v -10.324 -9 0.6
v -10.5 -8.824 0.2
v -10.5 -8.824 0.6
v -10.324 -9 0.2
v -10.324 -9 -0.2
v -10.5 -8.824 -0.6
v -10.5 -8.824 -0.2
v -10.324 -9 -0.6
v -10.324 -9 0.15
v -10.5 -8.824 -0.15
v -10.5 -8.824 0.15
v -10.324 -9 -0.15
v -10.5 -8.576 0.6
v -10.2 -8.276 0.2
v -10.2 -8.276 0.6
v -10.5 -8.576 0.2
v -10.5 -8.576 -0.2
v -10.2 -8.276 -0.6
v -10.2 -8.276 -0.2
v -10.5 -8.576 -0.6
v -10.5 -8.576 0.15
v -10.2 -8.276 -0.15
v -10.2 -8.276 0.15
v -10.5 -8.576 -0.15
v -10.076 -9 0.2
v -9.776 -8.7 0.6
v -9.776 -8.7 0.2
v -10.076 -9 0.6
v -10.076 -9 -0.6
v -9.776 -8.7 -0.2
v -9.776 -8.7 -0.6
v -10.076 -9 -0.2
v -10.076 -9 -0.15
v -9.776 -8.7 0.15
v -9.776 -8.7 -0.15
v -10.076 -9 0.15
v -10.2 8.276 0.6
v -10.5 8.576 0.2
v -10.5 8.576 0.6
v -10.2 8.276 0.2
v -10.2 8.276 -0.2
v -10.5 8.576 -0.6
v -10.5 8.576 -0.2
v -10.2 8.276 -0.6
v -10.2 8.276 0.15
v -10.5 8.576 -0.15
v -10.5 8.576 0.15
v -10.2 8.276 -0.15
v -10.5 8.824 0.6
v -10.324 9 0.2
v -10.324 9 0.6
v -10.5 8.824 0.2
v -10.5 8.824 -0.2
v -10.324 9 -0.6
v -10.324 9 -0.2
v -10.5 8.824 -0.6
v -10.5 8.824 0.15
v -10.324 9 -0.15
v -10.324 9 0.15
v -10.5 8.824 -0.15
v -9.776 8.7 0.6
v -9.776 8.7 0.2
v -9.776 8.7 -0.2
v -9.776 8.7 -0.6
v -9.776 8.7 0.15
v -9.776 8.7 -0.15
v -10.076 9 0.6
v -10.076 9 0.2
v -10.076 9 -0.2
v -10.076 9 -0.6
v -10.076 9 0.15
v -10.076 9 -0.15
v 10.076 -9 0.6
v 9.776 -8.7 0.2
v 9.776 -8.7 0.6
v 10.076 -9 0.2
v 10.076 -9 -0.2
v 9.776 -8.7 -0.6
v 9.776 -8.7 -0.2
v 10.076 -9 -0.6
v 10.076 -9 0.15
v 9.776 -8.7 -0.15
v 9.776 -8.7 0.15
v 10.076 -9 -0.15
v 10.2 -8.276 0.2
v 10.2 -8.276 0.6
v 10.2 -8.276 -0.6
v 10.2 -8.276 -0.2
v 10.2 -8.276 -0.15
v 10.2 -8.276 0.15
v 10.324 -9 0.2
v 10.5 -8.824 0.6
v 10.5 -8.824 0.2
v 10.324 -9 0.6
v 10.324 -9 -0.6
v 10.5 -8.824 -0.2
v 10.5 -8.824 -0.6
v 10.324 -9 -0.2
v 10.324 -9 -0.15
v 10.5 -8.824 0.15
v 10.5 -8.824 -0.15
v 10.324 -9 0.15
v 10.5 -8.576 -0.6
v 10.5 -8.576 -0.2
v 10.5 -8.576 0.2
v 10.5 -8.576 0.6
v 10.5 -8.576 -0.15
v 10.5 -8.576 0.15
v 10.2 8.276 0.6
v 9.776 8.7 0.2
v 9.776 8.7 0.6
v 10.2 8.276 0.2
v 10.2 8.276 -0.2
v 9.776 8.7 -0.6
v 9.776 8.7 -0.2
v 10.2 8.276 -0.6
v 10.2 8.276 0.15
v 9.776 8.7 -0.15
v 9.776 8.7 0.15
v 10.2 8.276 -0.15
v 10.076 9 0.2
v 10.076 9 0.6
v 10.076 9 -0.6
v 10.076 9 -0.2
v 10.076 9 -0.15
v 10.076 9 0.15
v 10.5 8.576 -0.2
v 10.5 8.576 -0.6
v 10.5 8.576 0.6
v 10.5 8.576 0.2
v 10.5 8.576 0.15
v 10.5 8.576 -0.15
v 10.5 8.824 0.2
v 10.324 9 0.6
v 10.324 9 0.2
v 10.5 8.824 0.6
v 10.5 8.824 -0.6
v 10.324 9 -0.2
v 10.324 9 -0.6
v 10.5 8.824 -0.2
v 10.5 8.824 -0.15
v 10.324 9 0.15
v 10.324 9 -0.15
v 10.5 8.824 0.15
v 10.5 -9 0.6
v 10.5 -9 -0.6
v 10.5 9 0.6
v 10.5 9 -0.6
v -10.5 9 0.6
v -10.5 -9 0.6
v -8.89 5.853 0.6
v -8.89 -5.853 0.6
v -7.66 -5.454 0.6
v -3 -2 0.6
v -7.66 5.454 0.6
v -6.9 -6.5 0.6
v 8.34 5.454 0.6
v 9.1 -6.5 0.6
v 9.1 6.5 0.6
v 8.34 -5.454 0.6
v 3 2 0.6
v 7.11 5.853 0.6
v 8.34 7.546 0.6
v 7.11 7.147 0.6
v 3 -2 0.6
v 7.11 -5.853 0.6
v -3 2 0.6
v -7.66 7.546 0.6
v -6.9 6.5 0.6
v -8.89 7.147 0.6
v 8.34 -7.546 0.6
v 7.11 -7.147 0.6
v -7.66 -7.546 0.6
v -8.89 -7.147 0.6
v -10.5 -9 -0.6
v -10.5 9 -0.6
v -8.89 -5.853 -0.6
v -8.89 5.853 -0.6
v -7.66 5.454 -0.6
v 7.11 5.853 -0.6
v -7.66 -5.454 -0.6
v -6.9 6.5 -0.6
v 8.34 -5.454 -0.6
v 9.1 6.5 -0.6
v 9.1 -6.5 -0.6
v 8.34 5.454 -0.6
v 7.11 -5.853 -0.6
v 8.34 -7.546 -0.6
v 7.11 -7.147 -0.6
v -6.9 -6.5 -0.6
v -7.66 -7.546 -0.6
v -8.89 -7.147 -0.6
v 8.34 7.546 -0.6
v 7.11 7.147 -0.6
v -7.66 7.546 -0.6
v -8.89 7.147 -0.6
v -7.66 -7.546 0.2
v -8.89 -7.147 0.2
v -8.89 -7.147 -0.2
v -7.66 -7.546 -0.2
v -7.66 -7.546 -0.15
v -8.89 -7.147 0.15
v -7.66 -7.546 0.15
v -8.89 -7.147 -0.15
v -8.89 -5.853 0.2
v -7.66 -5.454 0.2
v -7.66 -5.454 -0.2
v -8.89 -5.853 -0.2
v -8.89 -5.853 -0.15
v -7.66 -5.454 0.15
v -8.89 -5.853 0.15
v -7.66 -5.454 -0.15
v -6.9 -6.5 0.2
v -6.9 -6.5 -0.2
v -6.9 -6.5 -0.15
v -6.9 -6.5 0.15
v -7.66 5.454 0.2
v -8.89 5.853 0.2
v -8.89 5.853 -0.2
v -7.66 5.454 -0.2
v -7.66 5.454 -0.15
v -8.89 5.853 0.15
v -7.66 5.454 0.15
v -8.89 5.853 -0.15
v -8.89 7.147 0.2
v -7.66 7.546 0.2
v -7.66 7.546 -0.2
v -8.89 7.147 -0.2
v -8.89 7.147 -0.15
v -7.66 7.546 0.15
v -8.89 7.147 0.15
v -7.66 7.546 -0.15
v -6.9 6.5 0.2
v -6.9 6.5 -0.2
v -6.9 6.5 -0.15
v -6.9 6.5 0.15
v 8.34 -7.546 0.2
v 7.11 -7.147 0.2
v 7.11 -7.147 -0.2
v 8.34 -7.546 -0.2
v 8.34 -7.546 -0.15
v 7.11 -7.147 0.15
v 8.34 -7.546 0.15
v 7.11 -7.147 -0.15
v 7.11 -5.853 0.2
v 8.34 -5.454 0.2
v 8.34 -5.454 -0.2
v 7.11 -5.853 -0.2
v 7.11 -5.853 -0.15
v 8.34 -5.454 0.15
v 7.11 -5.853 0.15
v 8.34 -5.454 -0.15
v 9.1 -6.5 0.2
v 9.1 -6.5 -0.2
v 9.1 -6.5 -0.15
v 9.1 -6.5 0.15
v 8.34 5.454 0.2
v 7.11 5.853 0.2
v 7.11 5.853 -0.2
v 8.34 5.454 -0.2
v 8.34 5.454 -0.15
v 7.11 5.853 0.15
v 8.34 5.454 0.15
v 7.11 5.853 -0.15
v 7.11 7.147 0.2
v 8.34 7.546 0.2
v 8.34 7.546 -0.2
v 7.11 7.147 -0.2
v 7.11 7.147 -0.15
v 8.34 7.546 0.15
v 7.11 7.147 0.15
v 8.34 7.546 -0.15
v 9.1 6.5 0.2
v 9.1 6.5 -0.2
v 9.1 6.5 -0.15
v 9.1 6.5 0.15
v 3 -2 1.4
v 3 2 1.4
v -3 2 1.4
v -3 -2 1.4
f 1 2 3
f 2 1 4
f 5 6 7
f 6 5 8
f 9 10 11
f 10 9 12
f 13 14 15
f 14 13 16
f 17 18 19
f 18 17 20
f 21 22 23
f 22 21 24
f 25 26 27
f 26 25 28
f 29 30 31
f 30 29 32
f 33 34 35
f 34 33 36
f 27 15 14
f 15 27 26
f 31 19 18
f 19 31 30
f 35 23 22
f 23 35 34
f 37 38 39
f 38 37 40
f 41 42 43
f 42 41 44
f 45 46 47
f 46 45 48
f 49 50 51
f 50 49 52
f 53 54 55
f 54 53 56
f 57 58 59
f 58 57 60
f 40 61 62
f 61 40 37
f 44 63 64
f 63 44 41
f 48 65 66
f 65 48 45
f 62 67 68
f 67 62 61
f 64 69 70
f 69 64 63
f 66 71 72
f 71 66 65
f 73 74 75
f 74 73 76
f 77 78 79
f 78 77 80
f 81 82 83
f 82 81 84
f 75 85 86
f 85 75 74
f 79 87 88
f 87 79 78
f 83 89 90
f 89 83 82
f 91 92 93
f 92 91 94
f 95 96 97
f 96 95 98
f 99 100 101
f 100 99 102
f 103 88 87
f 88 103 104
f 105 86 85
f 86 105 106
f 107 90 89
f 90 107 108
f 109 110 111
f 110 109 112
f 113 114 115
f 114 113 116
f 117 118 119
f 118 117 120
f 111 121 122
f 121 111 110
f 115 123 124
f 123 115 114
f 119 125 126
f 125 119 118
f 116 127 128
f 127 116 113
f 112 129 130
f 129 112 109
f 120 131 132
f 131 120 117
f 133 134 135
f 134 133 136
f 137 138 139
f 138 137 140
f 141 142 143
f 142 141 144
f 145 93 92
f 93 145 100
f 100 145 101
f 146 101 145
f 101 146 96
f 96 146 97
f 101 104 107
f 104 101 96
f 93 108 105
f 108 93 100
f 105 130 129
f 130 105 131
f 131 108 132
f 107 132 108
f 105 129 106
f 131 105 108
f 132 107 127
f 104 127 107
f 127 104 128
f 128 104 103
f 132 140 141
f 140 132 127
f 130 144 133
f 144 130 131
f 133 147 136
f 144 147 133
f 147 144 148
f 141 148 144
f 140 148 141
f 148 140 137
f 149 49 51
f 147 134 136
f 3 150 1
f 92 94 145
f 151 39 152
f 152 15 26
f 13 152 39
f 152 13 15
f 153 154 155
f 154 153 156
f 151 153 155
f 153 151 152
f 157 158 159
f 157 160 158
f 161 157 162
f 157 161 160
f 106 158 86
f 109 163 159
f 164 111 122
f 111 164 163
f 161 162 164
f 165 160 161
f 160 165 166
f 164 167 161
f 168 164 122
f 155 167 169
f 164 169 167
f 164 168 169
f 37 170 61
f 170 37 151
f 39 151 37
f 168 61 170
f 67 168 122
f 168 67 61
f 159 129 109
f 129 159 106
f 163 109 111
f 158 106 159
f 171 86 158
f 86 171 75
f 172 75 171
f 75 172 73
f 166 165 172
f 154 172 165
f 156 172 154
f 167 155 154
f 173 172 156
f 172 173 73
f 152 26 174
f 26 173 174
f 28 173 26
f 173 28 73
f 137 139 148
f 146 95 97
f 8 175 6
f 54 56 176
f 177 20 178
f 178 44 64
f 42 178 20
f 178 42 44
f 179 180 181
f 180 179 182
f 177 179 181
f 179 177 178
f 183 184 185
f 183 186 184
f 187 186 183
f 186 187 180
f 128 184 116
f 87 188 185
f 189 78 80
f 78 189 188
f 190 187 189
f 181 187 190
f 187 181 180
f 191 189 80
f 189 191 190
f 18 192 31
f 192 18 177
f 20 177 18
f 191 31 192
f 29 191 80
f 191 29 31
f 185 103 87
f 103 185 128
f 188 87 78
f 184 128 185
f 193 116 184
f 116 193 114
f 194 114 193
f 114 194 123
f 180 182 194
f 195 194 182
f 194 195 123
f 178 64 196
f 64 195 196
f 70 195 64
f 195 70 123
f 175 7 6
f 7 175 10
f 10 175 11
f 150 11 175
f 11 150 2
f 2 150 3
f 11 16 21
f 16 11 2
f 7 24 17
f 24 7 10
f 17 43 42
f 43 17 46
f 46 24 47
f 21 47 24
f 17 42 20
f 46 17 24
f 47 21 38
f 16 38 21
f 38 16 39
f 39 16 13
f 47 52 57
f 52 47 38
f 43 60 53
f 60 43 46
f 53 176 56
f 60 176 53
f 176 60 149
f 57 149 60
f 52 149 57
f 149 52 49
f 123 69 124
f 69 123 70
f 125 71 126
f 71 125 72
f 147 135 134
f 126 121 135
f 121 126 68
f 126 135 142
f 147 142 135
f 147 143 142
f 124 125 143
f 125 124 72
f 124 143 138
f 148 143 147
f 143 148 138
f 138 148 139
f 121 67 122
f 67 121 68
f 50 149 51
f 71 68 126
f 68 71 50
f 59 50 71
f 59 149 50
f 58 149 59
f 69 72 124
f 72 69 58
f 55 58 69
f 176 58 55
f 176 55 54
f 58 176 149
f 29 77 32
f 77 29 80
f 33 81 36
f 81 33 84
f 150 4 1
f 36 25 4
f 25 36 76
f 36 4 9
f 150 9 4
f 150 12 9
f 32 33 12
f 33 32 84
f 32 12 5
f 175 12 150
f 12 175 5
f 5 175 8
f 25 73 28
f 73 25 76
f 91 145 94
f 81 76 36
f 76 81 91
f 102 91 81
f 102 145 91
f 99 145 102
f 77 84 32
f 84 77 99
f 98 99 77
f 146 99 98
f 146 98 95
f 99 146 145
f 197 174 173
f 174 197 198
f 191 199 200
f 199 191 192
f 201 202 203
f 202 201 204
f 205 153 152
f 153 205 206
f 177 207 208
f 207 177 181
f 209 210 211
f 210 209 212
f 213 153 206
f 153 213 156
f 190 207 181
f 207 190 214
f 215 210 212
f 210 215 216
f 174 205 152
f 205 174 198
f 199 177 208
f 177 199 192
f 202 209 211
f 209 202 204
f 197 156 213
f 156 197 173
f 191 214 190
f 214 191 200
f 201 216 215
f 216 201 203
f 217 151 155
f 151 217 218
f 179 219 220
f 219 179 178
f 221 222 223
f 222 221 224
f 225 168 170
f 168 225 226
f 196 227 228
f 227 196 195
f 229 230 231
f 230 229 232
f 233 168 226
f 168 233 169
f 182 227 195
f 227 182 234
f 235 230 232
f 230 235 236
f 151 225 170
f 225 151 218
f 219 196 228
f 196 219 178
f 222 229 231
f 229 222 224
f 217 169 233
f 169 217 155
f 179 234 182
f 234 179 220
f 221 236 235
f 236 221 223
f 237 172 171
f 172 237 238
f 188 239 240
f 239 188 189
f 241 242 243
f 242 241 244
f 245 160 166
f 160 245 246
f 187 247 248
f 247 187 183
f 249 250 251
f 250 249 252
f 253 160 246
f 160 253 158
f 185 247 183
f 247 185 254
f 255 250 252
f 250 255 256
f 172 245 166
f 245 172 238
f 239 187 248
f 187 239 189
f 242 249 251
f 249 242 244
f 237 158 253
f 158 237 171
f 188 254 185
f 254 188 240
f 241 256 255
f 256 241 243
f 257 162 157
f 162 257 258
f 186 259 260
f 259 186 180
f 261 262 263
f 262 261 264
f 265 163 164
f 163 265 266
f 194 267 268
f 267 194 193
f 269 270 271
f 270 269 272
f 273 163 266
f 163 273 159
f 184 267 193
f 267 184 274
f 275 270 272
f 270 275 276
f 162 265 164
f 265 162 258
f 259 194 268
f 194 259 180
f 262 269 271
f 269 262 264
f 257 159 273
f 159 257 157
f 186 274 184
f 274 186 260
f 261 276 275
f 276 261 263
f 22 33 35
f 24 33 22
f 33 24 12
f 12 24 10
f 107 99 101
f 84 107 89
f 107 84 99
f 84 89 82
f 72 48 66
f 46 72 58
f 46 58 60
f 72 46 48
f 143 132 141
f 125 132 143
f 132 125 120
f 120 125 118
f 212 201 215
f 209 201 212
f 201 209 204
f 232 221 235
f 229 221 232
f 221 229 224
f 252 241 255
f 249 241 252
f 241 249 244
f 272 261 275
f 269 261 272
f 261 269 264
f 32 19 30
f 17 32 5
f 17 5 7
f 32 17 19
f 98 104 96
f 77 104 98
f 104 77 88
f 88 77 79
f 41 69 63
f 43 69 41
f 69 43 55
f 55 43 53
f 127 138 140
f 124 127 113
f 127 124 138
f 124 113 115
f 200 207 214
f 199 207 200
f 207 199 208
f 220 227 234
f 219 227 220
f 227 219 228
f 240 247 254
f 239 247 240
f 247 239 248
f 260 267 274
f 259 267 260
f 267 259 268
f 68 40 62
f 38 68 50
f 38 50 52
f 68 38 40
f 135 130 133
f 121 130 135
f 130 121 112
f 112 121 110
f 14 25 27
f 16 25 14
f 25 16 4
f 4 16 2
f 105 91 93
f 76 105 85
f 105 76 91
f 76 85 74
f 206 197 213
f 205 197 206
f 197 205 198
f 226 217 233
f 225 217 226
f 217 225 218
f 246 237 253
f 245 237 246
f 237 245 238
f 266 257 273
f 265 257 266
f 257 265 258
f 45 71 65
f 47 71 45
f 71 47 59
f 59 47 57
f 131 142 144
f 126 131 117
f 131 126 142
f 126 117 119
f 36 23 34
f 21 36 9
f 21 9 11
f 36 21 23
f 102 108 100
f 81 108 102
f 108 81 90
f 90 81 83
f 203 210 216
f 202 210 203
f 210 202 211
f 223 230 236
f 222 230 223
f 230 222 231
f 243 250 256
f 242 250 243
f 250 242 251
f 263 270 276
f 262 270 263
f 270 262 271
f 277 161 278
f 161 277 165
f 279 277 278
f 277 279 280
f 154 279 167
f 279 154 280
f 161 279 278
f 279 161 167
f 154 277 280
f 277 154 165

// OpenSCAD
// Parameters
pcb_L = 21; //[10.5:42:0.1]
pcb_W = 18; //[9:36:0.1]
pcb_T = 1.2; //[0.6:2.4:0.1]
mask_T = 0.05; //[0.02:0.15:0.01]
silk_T = 0.02; //[0.01:0.08:0.01]
copper_T = 0.035; //[0.018:0.105:0.001]
hole_D = 2.2; //[1.2:4.4:0.1]
hole_edge_margin = 2.5; //[1.5:5:0.1]
chamfer_size = 0.6; //[0.2:1.5:0.1]
trace_W = 0.6; //[0.2:2:0.1]
trace_margin = 2.2; //[1:5:0.1]
trace_overlap = 0.8; //[0.5:2:0.1]
silk_line_W = 0.4; //[0.2:1.2:0.1]
silk_inset = 1.2; //[0.6:3:0.1]
comp_body_L = 6; //[3:12:0.1]
comp_body_W = 4; //[2:10:0.1]
comp_body_H = 1.6; //[0.8:6:0.1]
comp_offset_x = 0; //[-5:5:0.1]
comp_offset_y = 0; //[-5:5:0.1]

// PCB Body with Edge Chamfers
module pcb_body() {
  difference() {
    color([0.0, 0.4, 0.2]) // PCB color
    cube([pcb_L, pcb_W, pcb_T], center=true);
    for (x = [-1, 1], y = [-1, 1]) {
      translate([x * (pcb_L/2 - chamfer_size/2), y * (pcb_W/2 - chamfer_size/2), 0])
      rotate([0, 0, 45])
      cube([chamfer_size, chamfer_size, pcb_T*2], center=true);
    }
  }
}

// Mounting Holes
module mounting_holes() {
  for (x = [-1, 1], y = [-1, 1]) {
    translate([x * (pcb_L/2 - hole_edge_margin), y * (pcb_W/2 - hole_edge_margin), 0])
    cylinder(h=pcb_T*3, r=hole_D/2, center=true);
  }
}

// Copper Traces
module copper_traces() {
  color([0.72, 0.45, 0.2]) // Copper color
  union() {
    translate([0, 0, pcb_T/2 + copper_T/2 - trace_overlap])
    cube([pcb_L - 2*trace_margin, trace_W, copper_T], center=true);
    translate([0, 0, pcb_T/2 + copper_T/2 - trace_overlap])
    cube([trace_W, pcb_W - 2*trace_margin, copper_T], center=true);
  }
}

// Silkscreen
module silkscreen() {
  color([1, 1, 1]) // White silkscreen
  union() {
    translate([0, pcb_W/2 - silk_inset, pcb_T/2 + silk_T/2 - trace_overlap])
    cube([pcb_L - 2*silk_inset, silk_line_W, silk_T], center=true);
    translate([pcb_L/2 - silk_inset, 0, pcb_T/2 + silk_T/2 - trace_overlap])
    cube([silk_line_W, pcb_W - 2*silk_inset, silk_T], center=true);
  }
}

// Solder Mask
module solder_mask() {
  color([0.0, 0.4, 0.2, 0.5]) // Semi-transparent green
  union() {
    translate([0, 0, pcb_T/2 + mask_T/2 - trace_overlap])
    cube([pcb_L, pcb_W, mask_T], center=true);
    translate([0, 0, -pcb_T/2 - mask_T/2 + trace_overlap])
    cube([pcb_L, pcb_W, mask_T], center=true);
  }
}

// Component Placeholder
module component_placeholder() {
  color([0.85, 0.85, 0.8]) // Off-white for components
  translate([comp_offset_x, comp_offset_y, pcb_T/2 + comp_body_H/2 - trace_overlap])
  cube([comp_body_L, comp_body_W, comp_body_H], center=true);
}

// Complete PCB Model
module pcb_complete_model() {
  union() {
    difference() {
      pcb_body();
      mounting_holes();
    }
    solder_mask();
    copper_traces();
    silkscreen();
    component_placeholder();
  }
}

// Render the complete PCB model
pcb_complete_model();
